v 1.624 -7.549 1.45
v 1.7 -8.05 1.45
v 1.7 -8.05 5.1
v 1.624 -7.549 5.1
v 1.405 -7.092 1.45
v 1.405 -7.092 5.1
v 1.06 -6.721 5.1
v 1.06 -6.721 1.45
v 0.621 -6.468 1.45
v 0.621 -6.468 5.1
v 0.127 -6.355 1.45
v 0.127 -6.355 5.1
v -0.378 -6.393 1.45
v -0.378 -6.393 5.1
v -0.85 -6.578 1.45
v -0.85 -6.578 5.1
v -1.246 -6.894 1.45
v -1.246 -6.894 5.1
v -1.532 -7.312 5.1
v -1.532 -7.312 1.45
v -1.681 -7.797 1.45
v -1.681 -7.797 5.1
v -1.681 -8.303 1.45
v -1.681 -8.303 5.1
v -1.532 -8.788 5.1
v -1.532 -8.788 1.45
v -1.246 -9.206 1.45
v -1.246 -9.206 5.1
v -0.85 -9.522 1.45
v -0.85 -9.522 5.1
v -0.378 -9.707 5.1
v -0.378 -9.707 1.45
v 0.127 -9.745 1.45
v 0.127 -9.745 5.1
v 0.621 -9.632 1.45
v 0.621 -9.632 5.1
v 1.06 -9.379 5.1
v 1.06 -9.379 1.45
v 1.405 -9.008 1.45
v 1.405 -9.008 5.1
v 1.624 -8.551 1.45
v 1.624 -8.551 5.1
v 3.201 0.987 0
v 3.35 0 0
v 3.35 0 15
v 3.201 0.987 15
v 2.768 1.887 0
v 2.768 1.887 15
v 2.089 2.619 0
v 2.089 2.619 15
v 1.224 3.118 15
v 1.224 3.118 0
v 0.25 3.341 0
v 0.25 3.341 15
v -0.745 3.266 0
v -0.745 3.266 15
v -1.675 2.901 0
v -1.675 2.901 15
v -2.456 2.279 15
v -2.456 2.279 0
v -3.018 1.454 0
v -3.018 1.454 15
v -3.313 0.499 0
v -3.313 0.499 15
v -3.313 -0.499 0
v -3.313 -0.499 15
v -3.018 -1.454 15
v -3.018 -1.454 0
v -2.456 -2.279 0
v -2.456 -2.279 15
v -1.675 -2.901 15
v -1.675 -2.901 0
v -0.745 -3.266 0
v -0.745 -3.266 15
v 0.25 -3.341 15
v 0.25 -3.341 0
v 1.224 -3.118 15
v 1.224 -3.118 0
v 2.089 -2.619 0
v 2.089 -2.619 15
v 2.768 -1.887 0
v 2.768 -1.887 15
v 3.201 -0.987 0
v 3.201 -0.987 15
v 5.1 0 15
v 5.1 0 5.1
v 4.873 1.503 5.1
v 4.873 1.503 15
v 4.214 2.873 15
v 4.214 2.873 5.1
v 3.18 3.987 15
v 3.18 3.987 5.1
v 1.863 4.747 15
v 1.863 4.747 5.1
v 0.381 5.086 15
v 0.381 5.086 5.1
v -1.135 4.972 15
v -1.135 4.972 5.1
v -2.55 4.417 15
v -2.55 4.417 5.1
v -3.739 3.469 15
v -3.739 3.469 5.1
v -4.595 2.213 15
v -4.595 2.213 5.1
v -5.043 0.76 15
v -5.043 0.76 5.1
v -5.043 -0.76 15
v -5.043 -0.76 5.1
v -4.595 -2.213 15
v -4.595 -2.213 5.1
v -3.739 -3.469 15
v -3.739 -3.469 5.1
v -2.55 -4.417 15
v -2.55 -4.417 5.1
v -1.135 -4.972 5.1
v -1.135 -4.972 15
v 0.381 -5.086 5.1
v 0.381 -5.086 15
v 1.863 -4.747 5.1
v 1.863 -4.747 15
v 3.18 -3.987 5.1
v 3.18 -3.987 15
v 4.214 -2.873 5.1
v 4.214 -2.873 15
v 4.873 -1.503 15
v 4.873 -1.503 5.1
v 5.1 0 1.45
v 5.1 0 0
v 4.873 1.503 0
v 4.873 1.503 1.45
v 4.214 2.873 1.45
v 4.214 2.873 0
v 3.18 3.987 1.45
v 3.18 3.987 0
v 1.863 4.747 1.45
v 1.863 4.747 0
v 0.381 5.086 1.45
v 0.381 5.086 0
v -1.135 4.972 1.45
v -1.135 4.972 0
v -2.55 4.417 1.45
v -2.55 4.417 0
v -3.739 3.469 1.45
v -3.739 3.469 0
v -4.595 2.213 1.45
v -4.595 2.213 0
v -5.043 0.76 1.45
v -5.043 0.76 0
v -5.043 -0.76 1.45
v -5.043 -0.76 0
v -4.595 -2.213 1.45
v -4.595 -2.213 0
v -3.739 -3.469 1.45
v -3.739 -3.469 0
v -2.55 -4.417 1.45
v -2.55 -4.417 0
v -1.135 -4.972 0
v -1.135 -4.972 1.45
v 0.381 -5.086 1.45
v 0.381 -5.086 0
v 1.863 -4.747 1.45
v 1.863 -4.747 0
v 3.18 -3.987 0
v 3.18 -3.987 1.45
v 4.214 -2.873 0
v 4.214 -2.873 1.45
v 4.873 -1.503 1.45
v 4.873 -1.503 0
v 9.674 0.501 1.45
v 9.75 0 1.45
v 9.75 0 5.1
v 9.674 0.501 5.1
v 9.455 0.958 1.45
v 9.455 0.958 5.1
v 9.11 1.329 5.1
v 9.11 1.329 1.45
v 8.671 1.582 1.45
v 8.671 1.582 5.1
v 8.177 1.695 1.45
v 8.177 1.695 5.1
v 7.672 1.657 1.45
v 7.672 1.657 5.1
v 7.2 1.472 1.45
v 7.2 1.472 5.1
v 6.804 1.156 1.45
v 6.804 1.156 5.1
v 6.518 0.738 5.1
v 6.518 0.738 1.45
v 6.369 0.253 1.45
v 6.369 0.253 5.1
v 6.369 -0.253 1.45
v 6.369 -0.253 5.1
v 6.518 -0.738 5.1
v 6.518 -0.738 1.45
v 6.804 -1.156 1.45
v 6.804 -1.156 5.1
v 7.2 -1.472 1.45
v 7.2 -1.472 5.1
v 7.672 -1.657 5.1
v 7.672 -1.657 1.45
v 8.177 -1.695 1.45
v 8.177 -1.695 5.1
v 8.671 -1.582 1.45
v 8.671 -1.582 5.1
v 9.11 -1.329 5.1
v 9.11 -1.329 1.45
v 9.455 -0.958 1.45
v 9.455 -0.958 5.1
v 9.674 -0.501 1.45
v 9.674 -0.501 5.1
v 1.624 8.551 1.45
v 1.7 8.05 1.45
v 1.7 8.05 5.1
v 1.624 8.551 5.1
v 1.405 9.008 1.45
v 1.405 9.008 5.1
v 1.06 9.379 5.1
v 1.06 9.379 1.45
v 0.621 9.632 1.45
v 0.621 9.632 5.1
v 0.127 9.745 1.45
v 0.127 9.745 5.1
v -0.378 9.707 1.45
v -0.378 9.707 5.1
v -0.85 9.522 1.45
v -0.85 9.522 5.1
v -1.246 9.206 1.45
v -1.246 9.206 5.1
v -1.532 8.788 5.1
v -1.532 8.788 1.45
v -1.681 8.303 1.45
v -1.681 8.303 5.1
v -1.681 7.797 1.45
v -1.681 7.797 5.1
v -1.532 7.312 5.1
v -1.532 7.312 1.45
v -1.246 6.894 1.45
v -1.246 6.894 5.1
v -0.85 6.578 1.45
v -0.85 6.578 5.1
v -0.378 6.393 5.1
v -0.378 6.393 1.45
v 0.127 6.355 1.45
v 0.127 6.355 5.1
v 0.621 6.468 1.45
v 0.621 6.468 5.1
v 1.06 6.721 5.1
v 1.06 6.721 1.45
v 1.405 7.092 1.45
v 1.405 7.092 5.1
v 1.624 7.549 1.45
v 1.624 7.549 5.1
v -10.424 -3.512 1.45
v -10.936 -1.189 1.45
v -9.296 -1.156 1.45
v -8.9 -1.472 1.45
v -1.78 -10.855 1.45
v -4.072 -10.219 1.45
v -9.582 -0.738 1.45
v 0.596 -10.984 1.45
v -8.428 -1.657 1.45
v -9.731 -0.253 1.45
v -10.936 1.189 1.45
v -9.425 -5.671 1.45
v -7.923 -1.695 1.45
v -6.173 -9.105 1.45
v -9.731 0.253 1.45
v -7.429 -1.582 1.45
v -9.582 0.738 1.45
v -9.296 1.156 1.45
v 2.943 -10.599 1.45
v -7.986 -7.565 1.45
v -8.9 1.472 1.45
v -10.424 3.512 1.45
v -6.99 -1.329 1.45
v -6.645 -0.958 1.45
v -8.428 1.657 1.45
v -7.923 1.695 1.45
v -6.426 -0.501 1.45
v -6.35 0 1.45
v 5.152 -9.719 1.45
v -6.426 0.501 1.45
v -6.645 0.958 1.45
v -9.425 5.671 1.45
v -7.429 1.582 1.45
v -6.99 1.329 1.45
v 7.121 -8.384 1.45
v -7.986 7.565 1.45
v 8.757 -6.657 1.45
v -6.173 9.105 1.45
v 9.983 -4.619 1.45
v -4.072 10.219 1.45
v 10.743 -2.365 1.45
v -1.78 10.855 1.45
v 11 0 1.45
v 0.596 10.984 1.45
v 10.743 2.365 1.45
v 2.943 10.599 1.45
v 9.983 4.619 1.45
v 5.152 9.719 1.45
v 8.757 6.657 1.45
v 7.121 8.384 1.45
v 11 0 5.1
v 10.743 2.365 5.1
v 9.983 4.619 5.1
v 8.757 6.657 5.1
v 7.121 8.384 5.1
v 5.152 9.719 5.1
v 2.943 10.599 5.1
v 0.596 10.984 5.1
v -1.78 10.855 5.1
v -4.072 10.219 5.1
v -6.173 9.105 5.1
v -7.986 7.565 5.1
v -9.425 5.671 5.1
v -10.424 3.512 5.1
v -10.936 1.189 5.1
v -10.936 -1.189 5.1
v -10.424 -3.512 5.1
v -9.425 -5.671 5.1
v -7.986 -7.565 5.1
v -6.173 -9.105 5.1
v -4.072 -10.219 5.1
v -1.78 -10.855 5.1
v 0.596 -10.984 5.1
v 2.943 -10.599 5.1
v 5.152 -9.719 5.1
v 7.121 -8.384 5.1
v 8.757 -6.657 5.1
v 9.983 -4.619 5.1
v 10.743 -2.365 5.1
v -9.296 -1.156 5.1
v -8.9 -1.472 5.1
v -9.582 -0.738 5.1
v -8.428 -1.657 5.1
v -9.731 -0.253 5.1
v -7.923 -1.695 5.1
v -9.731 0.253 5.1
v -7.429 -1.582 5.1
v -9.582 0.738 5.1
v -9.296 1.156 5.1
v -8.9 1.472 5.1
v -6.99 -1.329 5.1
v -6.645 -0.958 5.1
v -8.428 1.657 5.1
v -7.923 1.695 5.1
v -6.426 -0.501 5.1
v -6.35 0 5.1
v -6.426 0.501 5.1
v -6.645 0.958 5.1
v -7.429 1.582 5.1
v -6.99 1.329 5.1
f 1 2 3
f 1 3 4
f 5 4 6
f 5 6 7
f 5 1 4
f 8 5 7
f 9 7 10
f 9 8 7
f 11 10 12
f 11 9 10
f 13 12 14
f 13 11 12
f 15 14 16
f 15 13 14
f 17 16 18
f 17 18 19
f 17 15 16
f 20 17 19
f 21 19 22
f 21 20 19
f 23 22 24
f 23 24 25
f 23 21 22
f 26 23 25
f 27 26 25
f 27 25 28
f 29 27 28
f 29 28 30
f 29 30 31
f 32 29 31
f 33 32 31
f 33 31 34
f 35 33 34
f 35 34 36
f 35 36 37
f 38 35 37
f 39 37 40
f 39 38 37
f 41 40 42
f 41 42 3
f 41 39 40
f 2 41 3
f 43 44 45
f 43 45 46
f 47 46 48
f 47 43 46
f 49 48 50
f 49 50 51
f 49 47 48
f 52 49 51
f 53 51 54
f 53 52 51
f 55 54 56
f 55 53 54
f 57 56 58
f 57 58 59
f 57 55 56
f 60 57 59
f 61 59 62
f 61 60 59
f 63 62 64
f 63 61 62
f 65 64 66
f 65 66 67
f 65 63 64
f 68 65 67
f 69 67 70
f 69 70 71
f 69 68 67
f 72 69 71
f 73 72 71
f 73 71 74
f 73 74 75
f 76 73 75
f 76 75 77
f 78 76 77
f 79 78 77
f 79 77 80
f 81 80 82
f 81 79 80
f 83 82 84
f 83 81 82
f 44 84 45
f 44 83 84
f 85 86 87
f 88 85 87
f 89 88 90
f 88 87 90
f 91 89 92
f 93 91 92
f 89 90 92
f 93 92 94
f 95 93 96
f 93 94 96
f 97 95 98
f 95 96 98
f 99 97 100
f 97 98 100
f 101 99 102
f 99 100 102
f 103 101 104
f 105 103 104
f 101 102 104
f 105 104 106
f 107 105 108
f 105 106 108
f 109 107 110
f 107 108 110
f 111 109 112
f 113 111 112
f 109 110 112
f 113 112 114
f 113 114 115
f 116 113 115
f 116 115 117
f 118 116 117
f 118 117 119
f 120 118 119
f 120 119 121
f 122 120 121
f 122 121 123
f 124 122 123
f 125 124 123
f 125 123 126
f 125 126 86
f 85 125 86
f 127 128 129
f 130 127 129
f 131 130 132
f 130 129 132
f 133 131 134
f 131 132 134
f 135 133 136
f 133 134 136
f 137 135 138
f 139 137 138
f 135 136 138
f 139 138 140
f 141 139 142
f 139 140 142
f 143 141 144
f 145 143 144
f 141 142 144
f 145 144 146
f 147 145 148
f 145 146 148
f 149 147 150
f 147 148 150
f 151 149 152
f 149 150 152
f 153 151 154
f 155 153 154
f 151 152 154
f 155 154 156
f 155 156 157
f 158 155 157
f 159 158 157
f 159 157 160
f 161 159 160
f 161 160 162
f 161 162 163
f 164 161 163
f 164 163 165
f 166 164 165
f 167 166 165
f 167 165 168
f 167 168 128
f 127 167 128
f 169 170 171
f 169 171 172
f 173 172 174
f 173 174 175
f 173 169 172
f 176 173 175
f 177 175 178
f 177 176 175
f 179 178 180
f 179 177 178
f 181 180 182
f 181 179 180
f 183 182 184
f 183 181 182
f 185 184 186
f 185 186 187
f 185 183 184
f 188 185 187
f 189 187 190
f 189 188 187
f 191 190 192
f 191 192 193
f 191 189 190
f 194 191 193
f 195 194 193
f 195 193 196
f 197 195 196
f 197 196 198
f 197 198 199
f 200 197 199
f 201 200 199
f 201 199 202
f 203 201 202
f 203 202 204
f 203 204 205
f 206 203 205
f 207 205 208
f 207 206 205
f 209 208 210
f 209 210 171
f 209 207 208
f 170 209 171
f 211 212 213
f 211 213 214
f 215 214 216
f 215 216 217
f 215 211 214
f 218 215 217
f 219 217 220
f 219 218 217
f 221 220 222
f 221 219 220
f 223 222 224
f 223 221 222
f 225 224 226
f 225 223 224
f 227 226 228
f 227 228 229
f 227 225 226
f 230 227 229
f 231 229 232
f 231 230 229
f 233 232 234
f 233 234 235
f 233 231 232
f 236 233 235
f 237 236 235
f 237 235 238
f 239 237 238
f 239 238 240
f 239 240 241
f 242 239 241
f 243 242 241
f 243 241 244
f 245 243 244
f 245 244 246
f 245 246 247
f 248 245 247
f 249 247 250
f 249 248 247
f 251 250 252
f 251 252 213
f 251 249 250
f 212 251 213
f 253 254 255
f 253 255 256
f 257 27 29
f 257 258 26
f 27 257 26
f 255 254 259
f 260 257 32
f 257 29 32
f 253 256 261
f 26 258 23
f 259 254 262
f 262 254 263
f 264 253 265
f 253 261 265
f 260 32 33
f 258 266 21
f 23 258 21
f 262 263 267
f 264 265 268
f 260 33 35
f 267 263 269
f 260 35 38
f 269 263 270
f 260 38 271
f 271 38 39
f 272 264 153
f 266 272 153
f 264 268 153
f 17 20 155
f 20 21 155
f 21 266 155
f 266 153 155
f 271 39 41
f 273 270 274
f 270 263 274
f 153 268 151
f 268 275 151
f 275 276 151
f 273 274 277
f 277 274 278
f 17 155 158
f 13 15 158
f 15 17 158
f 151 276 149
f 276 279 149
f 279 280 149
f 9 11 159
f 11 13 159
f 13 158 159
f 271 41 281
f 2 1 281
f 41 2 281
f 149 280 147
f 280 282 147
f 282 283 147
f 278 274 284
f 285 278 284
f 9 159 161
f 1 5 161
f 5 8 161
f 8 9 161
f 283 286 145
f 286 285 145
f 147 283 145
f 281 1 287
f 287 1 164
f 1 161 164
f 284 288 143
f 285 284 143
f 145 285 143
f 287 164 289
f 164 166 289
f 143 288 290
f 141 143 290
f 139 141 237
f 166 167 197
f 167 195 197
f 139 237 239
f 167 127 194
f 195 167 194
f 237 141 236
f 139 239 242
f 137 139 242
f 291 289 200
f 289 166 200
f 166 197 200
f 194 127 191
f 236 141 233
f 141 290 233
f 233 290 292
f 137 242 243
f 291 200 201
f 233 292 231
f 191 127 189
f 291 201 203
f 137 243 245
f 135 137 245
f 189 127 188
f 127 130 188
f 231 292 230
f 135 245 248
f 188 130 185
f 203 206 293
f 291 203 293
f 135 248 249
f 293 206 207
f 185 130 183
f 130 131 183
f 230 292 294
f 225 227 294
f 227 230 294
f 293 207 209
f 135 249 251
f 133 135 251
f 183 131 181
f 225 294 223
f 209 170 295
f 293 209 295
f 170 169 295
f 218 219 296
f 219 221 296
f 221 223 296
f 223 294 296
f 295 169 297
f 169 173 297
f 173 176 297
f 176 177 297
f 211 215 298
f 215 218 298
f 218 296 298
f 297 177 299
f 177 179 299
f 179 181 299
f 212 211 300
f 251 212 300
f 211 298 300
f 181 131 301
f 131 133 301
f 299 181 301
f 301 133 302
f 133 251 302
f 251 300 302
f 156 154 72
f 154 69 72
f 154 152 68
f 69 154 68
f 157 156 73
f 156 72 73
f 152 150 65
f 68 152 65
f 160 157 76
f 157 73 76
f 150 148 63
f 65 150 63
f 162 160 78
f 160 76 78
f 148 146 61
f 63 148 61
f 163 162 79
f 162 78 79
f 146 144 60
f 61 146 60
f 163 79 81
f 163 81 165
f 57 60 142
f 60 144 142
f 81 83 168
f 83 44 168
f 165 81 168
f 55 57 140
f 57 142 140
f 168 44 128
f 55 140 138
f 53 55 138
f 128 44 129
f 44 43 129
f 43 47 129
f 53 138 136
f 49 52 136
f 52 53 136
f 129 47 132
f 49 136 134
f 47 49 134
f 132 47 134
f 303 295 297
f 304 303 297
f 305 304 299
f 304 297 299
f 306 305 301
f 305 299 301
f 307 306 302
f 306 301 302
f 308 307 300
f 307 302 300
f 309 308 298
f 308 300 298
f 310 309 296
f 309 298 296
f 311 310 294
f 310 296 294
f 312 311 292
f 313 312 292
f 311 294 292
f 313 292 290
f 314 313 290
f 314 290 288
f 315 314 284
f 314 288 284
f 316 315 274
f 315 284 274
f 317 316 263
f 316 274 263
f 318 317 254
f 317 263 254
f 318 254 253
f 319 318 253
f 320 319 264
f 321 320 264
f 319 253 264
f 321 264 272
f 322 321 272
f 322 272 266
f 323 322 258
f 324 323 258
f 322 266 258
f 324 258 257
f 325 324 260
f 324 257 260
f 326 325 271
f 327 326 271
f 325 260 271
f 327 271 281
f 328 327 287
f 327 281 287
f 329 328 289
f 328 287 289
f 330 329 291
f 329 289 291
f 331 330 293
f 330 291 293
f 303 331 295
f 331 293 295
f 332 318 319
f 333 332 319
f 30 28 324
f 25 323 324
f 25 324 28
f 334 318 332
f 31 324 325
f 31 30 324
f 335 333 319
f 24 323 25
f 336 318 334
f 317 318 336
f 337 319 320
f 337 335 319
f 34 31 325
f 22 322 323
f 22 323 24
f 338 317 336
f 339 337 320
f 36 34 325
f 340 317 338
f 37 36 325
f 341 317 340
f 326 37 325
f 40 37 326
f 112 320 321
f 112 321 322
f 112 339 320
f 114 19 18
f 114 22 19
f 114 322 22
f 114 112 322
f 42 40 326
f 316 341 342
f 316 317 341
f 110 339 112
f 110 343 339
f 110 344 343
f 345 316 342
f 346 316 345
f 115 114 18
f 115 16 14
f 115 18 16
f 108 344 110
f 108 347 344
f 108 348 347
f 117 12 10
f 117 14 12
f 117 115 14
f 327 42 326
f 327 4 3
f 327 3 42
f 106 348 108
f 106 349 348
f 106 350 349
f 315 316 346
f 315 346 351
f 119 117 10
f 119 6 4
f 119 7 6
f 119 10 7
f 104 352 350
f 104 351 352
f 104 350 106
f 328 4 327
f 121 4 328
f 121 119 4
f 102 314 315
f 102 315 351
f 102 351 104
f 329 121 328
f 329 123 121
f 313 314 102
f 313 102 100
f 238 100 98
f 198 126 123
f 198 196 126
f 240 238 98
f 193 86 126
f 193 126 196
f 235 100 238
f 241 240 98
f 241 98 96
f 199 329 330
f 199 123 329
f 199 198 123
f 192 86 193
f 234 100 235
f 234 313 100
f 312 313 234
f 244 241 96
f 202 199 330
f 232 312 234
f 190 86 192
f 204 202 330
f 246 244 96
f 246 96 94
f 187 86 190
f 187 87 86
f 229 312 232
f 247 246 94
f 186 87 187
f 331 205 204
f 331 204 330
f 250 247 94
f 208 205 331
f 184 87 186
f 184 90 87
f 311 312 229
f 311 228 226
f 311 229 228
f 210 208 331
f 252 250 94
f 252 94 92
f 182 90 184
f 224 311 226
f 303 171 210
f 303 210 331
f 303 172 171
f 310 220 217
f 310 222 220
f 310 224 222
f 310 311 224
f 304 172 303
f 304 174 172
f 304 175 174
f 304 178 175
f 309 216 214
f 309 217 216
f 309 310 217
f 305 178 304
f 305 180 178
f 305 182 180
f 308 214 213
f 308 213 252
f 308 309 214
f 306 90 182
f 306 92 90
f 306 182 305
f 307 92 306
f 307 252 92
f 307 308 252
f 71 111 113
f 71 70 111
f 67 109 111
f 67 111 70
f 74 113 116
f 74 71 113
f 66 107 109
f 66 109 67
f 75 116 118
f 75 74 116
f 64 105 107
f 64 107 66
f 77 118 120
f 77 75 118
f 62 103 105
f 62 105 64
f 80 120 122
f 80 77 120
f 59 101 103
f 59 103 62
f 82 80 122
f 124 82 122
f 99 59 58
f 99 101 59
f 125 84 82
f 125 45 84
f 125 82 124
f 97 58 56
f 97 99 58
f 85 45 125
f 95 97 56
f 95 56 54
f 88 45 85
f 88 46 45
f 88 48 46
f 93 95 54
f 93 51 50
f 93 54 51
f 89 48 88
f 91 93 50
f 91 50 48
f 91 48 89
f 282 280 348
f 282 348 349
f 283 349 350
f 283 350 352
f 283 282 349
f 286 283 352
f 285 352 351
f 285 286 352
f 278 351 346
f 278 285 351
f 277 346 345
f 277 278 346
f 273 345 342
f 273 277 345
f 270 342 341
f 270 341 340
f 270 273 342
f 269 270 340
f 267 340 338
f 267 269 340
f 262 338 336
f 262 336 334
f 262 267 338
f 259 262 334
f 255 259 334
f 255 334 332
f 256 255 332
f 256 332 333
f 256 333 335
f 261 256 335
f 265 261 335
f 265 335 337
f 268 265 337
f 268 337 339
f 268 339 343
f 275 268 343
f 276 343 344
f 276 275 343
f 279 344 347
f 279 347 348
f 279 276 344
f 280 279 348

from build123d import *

# Parameters (mm, degrees)
F0_R     = 5.1
F0_R_2   = 3.35
F1_DEPTH = 15
F2_START = 1.45
F0_R_3   = 11
F0_R_4   = 1.7
F2_DEPTH = 3.65


with BuildPart() as f1:
    # F0 (on Top) → F1 (new body)
    with BuildSketch(Plane.XY):
        Circle(F0_R)
        Circle(F0_R_2, mode=Mode.SUBTRACT)
    extrude(amount=F1_DEPTH)

    # F0 (on Top) → F2 (join)
    with BuildSketch(Plane.XY.offset(F2_START)):
        Circle(F0_R_3)
        with Locations((0, -8.05)):
            Circle(F0_R_4, mode=Mode.SUBTRACT)
        with Locations((-8.05, 0)):
            Circle(F0_R_4, mode=Mode.SUBTRACT)
        Circle(F0_R, mode=Mode.SUBTRACT)
        with Locations((8.05, 0)):
            Circle(F0_R_4, mode=Mode.SUBTRACT)
        with Locations((0, 8.05)):
            Circle(F0_R_4, mode=Mode.SUBTRACT)
    extrude(amount=F2_DEPTH)


solid = f1.part
